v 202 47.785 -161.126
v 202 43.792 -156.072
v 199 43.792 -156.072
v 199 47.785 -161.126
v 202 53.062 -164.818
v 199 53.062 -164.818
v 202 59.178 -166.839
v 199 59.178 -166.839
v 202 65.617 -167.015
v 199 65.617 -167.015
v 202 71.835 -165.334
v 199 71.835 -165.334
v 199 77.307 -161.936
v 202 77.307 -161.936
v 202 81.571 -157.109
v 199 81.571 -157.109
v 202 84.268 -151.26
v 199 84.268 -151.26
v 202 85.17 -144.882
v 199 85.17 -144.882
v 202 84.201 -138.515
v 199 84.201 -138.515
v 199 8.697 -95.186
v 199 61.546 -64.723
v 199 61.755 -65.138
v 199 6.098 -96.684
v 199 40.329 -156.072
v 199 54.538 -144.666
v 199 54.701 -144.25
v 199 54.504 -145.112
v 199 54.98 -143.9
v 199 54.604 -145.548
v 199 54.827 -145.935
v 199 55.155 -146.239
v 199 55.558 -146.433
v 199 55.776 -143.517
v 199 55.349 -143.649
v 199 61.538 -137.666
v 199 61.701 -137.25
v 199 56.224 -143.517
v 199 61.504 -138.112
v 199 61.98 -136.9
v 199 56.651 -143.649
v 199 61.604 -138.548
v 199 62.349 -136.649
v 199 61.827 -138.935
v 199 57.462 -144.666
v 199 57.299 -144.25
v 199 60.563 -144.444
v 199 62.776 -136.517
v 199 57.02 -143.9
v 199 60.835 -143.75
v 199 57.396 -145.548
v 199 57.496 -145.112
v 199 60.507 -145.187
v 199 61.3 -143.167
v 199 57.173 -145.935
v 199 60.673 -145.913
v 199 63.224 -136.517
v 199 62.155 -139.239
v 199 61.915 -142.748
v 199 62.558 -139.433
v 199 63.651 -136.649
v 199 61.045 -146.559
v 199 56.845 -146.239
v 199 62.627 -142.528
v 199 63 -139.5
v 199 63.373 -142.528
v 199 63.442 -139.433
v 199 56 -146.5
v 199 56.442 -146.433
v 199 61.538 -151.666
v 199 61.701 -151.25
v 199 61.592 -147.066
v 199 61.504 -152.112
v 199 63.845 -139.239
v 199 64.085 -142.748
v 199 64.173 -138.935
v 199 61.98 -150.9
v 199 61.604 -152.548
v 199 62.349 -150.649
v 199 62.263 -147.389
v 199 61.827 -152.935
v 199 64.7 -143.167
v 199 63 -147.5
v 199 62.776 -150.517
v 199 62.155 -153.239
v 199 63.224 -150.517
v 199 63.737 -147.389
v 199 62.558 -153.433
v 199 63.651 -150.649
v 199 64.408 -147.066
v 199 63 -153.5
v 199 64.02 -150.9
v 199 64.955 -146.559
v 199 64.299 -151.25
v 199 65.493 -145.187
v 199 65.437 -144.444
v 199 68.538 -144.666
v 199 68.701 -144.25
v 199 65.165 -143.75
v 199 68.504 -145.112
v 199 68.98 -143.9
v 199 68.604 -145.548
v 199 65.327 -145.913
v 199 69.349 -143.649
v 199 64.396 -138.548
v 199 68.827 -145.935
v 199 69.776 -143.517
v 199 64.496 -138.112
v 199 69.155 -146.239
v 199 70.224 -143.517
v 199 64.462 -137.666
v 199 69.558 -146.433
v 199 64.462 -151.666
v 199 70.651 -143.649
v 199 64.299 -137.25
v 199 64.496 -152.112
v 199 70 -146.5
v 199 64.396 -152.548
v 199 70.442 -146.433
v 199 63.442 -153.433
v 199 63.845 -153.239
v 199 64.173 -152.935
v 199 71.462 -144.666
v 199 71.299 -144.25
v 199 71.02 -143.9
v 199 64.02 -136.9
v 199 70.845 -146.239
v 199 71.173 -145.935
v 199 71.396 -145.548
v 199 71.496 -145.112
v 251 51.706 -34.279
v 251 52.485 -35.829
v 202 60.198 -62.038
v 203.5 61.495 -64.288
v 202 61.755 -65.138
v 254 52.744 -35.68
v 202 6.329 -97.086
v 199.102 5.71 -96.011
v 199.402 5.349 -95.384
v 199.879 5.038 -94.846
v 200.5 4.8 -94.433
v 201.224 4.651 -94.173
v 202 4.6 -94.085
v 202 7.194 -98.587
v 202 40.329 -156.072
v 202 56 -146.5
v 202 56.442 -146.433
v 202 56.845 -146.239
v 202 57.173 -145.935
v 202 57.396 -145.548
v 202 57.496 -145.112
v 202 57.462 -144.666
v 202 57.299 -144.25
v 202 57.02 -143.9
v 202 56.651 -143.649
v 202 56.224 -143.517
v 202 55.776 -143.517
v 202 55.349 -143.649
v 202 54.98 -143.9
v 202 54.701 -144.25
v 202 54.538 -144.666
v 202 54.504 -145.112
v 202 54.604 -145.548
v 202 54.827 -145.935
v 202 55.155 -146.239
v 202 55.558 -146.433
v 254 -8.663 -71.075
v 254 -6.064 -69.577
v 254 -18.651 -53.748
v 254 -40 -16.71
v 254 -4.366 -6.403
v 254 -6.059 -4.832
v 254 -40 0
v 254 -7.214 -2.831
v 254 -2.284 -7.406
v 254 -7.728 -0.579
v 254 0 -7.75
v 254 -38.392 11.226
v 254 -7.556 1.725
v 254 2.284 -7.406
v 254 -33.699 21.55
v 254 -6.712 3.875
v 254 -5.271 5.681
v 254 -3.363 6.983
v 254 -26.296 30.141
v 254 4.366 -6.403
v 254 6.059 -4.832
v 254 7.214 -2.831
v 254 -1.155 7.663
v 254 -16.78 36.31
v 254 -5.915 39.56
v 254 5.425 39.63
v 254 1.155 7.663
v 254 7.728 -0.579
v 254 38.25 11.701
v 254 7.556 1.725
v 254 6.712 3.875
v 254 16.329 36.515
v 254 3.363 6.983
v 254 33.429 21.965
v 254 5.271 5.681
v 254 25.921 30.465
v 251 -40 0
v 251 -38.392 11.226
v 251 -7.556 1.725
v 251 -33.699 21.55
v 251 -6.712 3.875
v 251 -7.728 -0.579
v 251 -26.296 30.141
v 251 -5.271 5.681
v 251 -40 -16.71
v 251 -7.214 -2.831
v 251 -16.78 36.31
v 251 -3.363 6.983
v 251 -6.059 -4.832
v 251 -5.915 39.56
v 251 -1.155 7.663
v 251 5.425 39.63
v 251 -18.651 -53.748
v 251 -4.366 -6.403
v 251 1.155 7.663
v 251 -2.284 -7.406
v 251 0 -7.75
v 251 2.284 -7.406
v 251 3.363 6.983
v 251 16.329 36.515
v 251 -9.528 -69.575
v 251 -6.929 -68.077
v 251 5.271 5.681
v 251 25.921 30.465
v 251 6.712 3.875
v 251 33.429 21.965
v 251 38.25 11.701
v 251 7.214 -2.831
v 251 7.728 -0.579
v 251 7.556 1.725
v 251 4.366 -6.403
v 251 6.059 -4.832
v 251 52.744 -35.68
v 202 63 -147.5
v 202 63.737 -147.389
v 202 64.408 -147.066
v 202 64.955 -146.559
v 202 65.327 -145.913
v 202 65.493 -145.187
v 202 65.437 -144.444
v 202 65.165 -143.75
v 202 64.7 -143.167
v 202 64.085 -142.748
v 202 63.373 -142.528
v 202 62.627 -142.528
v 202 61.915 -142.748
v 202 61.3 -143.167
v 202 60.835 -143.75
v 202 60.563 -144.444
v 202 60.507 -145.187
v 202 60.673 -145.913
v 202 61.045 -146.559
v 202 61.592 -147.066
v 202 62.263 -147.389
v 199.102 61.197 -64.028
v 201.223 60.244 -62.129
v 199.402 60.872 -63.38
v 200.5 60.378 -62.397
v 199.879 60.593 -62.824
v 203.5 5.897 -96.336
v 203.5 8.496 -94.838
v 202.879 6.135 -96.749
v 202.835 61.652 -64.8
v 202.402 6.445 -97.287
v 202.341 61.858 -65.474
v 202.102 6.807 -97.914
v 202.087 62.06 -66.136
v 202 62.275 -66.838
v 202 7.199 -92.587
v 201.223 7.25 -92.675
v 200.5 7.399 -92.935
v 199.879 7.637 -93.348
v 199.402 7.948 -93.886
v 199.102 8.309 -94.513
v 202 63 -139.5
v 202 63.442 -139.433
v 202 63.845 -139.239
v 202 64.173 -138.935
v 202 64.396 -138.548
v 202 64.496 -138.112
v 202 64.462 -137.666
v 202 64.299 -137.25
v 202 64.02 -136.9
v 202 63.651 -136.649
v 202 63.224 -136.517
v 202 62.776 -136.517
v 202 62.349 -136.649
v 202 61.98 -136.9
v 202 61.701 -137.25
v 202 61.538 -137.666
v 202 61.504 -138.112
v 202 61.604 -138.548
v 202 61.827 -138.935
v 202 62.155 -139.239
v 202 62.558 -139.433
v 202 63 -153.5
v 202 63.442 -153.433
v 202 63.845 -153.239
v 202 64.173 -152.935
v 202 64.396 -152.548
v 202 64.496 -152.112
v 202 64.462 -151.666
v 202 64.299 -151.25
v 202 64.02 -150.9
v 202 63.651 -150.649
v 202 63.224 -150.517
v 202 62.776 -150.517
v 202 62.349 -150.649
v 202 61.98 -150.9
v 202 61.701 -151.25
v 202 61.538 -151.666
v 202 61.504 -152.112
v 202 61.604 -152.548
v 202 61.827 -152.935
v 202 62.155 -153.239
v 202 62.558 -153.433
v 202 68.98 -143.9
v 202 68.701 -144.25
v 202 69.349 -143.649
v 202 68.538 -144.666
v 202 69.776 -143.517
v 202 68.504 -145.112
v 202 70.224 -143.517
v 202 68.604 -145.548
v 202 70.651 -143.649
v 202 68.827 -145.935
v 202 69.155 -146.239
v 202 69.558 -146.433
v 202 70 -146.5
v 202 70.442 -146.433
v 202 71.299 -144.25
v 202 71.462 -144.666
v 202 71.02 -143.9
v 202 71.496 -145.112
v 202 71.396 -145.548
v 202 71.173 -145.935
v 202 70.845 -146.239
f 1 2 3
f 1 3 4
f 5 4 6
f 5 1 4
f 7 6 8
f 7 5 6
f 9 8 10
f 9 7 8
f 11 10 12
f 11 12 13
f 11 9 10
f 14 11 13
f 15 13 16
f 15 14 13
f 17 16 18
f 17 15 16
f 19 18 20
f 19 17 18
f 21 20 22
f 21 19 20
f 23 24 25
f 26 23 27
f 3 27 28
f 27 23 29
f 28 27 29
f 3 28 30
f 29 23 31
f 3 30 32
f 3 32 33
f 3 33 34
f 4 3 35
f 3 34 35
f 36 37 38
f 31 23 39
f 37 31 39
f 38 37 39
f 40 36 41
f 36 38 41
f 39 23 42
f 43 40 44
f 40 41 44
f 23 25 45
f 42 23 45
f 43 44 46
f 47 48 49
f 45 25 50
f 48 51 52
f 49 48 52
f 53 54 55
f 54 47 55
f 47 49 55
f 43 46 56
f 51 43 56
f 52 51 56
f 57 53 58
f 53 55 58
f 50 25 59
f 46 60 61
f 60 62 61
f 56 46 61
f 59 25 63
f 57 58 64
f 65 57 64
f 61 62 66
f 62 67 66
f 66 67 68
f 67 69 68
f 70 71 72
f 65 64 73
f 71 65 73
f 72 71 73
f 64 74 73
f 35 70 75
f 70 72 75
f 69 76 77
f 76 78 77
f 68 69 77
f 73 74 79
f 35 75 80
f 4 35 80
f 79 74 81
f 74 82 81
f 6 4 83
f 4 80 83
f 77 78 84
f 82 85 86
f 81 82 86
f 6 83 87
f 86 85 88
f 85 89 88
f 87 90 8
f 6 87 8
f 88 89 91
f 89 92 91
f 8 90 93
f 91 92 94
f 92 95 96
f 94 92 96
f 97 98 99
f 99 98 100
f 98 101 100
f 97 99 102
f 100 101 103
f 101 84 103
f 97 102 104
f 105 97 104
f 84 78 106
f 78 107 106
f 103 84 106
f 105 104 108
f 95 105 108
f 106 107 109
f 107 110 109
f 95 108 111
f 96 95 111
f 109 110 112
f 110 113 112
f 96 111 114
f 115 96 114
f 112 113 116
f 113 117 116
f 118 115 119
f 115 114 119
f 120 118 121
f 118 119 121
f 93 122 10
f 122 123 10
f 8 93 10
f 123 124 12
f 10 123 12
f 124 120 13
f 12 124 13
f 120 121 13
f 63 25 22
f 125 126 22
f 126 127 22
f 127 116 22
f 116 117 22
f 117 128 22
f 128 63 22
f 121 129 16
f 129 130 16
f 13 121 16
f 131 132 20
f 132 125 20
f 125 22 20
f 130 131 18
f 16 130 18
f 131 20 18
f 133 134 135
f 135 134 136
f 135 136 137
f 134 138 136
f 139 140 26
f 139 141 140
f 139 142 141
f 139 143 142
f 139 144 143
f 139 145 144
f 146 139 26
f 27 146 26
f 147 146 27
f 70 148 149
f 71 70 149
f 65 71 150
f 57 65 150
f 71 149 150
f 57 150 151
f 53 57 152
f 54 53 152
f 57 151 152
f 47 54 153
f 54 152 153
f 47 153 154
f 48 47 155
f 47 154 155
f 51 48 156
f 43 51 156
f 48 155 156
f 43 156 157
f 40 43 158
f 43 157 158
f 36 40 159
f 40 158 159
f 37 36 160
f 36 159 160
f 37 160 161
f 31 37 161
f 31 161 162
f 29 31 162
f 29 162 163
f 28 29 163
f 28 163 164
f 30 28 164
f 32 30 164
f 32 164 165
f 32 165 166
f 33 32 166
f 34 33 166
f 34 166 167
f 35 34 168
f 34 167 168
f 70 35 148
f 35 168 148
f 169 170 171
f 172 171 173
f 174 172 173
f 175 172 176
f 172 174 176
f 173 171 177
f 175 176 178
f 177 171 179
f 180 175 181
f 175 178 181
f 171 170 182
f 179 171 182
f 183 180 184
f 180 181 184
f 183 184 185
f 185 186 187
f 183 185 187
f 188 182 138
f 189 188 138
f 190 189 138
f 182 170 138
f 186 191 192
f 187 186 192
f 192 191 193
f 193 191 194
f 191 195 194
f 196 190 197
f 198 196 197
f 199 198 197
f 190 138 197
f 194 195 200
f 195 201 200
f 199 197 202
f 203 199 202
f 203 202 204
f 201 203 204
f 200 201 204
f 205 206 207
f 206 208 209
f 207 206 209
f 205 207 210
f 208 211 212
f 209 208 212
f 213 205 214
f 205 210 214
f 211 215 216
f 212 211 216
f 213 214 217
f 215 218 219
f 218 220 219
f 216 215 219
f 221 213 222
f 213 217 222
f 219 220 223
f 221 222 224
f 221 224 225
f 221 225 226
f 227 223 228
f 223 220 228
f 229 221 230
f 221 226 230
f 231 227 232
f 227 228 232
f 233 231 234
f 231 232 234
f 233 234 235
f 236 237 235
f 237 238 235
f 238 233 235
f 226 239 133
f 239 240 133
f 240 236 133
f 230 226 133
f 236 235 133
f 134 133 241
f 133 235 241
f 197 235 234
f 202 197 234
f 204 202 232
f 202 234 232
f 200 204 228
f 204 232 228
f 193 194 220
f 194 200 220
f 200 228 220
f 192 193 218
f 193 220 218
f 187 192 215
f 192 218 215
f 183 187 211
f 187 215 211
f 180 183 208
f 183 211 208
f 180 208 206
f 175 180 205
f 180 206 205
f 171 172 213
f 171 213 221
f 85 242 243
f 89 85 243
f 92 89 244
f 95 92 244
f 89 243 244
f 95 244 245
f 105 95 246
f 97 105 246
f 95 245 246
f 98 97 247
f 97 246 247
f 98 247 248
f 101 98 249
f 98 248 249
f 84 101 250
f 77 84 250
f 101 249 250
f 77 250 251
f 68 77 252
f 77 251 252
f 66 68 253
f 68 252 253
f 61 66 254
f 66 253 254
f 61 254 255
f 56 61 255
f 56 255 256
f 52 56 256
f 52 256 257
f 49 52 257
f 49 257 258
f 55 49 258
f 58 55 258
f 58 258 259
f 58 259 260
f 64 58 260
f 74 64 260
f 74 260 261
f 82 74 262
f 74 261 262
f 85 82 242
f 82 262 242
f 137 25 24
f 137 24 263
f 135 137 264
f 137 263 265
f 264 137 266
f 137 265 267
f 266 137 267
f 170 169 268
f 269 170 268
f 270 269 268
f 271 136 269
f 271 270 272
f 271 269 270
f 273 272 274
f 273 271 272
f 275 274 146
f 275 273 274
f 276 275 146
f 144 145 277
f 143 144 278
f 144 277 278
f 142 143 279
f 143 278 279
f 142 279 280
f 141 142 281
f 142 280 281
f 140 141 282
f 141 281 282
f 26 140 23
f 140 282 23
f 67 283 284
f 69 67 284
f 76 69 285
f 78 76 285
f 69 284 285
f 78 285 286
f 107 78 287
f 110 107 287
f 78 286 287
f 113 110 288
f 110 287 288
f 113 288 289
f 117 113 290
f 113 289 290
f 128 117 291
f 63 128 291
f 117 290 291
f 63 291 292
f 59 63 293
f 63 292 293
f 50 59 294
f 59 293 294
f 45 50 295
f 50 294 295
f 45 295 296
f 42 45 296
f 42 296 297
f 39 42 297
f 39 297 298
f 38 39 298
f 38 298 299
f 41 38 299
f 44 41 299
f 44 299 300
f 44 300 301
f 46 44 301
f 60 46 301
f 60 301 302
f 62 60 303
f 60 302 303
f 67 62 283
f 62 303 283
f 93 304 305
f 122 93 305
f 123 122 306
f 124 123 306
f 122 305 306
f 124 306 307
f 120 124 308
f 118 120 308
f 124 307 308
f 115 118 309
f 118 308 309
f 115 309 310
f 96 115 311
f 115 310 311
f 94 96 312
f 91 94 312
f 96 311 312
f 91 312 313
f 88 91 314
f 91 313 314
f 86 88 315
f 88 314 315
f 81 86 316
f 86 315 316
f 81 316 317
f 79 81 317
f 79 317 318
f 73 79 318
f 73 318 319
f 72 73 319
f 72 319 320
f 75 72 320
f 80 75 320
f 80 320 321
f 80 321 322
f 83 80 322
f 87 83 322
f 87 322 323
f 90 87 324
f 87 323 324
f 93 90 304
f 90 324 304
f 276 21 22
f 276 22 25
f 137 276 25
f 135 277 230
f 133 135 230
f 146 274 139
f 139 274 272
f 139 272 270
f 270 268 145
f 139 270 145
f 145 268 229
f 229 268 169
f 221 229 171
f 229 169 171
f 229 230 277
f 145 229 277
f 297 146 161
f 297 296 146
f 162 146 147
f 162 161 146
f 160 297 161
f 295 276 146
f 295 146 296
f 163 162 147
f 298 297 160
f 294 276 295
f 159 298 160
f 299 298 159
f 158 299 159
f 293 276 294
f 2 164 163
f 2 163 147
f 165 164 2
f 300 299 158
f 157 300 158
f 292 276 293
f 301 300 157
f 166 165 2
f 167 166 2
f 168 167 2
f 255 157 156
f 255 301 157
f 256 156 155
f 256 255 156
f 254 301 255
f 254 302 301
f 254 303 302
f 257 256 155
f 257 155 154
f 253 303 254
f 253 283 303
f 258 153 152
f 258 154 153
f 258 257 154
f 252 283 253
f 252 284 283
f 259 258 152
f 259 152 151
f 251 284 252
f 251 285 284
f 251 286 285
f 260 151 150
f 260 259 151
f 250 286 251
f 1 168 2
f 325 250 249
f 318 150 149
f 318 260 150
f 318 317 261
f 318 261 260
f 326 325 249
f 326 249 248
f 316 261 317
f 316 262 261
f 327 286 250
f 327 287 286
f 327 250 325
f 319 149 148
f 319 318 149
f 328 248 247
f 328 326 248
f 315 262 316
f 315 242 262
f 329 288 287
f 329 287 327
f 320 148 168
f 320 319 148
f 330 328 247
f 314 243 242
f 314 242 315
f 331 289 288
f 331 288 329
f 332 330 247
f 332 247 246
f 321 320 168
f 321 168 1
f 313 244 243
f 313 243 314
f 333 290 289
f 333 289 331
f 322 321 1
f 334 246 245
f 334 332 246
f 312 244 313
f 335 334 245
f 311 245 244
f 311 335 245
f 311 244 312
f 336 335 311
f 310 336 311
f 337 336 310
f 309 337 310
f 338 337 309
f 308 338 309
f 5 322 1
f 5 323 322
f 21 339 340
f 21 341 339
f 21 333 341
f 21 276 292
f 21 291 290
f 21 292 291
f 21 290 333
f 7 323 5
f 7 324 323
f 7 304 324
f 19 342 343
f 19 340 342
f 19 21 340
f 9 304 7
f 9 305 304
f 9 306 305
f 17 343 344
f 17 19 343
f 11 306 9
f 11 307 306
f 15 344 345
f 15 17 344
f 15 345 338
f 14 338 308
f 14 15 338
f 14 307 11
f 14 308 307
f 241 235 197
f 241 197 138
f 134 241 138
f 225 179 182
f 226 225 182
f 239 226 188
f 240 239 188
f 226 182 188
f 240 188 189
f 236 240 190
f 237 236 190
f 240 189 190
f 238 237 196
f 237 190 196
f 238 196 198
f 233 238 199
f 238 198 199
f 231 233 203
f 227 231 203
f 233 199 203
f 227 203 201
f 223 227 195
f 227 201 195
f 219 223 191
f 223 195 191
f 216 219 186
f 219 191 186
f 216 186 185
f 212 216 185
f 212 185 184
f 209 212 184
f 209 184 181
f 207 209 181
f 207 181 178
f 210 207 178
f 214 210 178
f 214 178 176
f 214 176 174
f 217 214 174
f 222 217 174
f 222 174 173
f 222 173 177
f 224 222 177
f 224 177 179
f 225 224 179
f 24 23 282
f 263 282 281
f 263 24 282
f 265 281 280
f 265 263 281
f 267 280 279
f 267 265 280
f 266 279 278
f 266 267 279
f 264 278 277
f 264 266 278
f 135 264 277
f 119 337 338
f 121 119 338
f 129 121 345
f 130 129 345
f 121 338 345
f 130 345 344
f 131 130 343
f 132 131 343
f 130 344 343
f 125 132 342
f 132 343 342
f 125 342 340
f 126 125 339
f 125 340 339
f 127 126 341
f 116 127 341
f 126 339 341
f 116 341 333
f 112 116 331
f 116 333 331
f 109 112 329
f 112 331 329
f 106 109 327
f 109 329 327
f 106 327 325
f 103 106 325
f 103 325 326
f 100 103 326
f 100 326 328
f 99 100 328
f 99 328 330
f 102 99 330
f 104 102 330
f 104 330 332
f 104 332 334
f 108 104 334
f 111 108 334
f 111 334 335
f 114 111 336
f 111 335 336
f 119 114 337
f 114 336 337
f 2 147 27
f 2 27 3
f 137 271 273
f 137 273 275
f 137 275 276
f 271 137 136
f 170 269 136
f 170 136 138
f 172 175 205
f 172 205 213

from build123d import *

# Parameters (mm, degrees)
SKETCH_2_R           = 3
SKETCH_2_R_2         = 1.5
SKETCH_2_R_3         = 2.5
EXTRUDE_1_DEPTH      = 3
EXTRUDE_2_DEPTH      = 196
SKETCH_5_R           = 8
CUT_EXTRUDE_1_DEPTH  = 10
SKETCH_6_R           = 4.05
CUT_EXTRUDE_2_DEPTH  = 10
SKETCH_8_R           = 40
EXTRUDE_3_DEPTH      = 3
EXTRUDE_START        = -61
EXTRUDE_4_DEPTH      = 64
EXTRUDE_5_DEPTH      = 3
EXTRUDE_START_2      = -3
EXTRUDE_14_DEPTH     = 3
EXTRUDE_15_DEPTH     = 3
SKETCH_16_R          = 40
EXTRUDE_16_DEPTH     = 3
CUT_EXTRUDE_START    = -20
CUT_EXTRUDE_5_DEPTH  = 20
CUT_EXTRUDE_6_DEPTH  = 20
CUT_EXTRUDE_7_DEPTH  = 3
FILLET_3_R           = 3
FILLET_4_R           = 3
FILLET_5_R           = 3
FILLET_6_R           = 3
SKETCH_22_R          = 7.75
CUT_EXTRUDE_8_DEPTH  = 10
SKETCH_23_R          = 4.05
CUT_EXTRUDE_9_DEPTH  = 10
CUT_EXTRUDE_10_DEPTH = 10
CUT_EXTRUDE_11_DEPTH = 10
SKETCH_26_W          = 471.047466431
SKETCH_26_H          = 304.479350924
CUT_EXTRUDE_12_DEPTH = 135


# Some blends are built 0.0001 mm under size
with BuildPart() as part:
    # 草图2 → 凸台-拉伸1 (new body)
    with BuildSketch(Plane(origin=(0, 0, 0), x_dir=(0, 0, -1), z_dir=(1, 0, 0))):
        with BuildLine():
            Line((138.514809283, 84.200667909), (-11.70063651, 38.25042621))
            ThreePointArc((-11.70063651, 38.25042621), (-39.560188627, -5.915359313), (0, -40))
            Line((0, -40), (16.710190716, -40))
            Line((16.710190716, -40), (156.071648789, 40.329376559))
            Line((156.071648789, 40.329376559), (156.071648789, 43.792069046))
            ThreePointArc((156.071648789, 43.792069046), (165.334026038, 71.834783727), (138.514809283, 84.200667909))
        make_face()
        Circle(SKETCH_2_R, mode=Mode.SUBTRACT)
        with Locations((145, 70)):
            Circle(SKETCH_2_R_2, mode=Mode.SUBTRACT)
        with Locations((138, 63)):
            Circle(SKETCH_2_R_2, mode=Mode.SUBTRACT)
        with Locations((145, 56)):
            Circle(SKETCH_2_R_2, mode=Mode.SUBTRACT)
        with Locations((145, 63)):
            Circle(SKETCH_2_R_3, mode=Mode.SUBTRACT)
        with Locations((152, 63)):
            Circle(SKETCH_2_R_2, mode=Mode.SUBTRACT)
    extrude_1 = extrude(amount=EXTRUDE_1_DEPTH)

    # 草图4 → 凸台-拉伸2 (add)
    with BuildSketch(Plane(origin=(3, 0, 0), x_dir=(0, 0, -1), z_dir=(1, 0, 0))):
        with BuildLine():
            Line((0, -40), (16.710190716, -40))
            Line((16.710190716, -40), (156.071648789, 40.329376559))
            Line((156.071648789, 40.329376559), (156.071648789, 43.792069046))
            Line((156.071648789, 43.792069046), (19.975563357, -34.655113166))
            ThreePointArc((19.975563357, -34.655113166), (10.339136167, -38.640681455), (0, -40))
        make_face()
    extrude(amount=EXTRUDE_2_DEPTH)

    # 镜向2: 凸台-拉伸1 across plane
    add(extrude_1.mirror(Plane(origin=(101, 0, 0), x_dir=(0, 0, 1), z_dir=(1, 0, 0))))

    # 草图5 → 切除-拉伸1 (cut)
    with BuildSketch(Plane(origin=(202, 0, 0), x_dir=(0, 0, -1), z_dir=(1, 0, 0))):
        Circle(SKETCH_5_R)
    extrude(amount=-CUT_EXTRUDE_1_DEPTH, mode=Mode.SUBTRACT)

    # 草图6 → 切除-拉伸2 (cut)
    with BuildSketch(Plane.ZY):
        Circle(SKETCH_6_R)
    extrude(amount=-CUT_EXTRUDE_2_DEPTH, mode=Mode.SUBTRACT)

    # 草图9 → 凸台-拉伸4 (add)
    with BuildSketch(Plane(origin=(251, 0, 0), x_dir=(0, 0, -1), z_dir=(1, 0, 0)).offset(EXTRUDE_START)):
        with BuildLine():
            Line((0, -40), (16.710190716, -40))
            Line((16.710190716, -40), (53.747942483, -18.651059269))
            Line((53.747942483, -18.651059269), (52.249775231, -16.051925781))
            Line((52.249775231, -16.051925781), (19.975563357, -34.655113166))
            ThreePointArc((19.975563357, -34.655113166), (10.339136167, -38.640681455), (0, -40))
        make_face()
    extrude_4 = extrude(amount=EXTRUDE_4_DEPTH)

    # 草图10 → 凸台-拉伸5 (add)
    with BuildSketch(Plane(origin=(0, -37.254246654, -21.473730609), x_dir=(1, 0, 0), z_dir=(0, -0.8663778291595938, -0.49938908392225567))):
        Polygon((254, -37.251890328), (254, -57.251890328), (202, -87.274104325), (202, -37.251890328), align=None)
    extrude_5 = extrude(amount=-EXTRUDE_5_DEPTH)



with BuildPart() as body_2:
    # 草图8 → 凸台-拉伸3 (new body)
    with BuildSketch(Plane(origin=(251, 0, 0), x_dir=(0, 0, -1), z_dir=(1, 0, 0))):
        Circle(SKETCH_8_R)
    extrude(amount=EXTRUDE_3_DEPTH)


with BuildPart() as part_1:
    add(part.part)

    add(body_2.part)  # 凸台-拉伸14 merges body 2
    # 草图14 → 凸台-拉伸14 (add)
    with BuildSketch(Plane(origin=(254, 0, 0), x_dir=(0, 0, -1), z_dir=(1, 0, 0)).offset(EXTRUDE_START_2)):
        with BuildLine():
            Line((-11.70063651, 38.25042621), (35.679778873, 52.743886101))
            Line((35.679778873, 52.743886101), (69.577331814, -6.064144103))
            Line((69.577331814, -6.064144103), (19.975563357, -34.655113166))
            ThreePointArc((19.975563357, -34.655113166), (36.686823541, 15.939792297), (-11.70063651, 38.25042621))
        make_face()
    extrude_14 = extrude(amount=EXTRUDE_14_DEPTH)

    # 草图15 → 凸台-拉伸15 (add)
    with BuildSketch(Plane(origin=(88.290795719, 76.368648195, -132.490087928), x_dir=(-0.8660254037844362, 0.24969454196113006, -0.43318891457980085), z_dir=(0.5000000000000046, 0.43248363304931103, -0.7503052093278205))):
        Polygon((-191.344507397, -43), (-191.344507397, 27.878041456), (-131.300079402, 20.97393325), (-131.300079402, -43), align=None)
    extrude_15 = extrude(amount=-EXTRUDE_15_DEPTH)

    # 镜向8: 凸台-拉伸15 across plane
    add(extrude_15.mirror(Plane(origin=(101, 0, 0), x_dir=(0, 0, 1), z_dir=(1, 0, 0))))

    # 镜向10: 凸台-拉伸5 across plane
    add(extrude_5.mirror(Plane(origin=(101, 0, 0), x_dir=(0, 0, 1), z_dir=(1, 0, 0))))

    # 镜向11: 凸台-拉伸4 across plane
    add(extrude_4.mirror(Plane(origin=(101, 0, 0), x_dir=(0, 0, 1), z_dir=(1, 0, 0))))

    # 镜向12: 凸台-拉伸14 across plane
    add(extrude_14.mirror(Plane(origin=(101, 0, 0), x_dir=(0, 0, 1), z_dir=(1, 0, 0))))

    # 草图16 → 凸台-拉伸16 (add)
    with BuildSketch(Plane.ZY.offset(52)):
        Circle(SKETCH_16_R)
    extrude(amount=-EXTRUDE_16_DEPTH)

    # 草图17 → 切除-拉伸5 (cut)
    with BuildSketch(Plane(origin=(202, 0, 0), x_dir=(0, 0, -1), z_dir=(1, 0, 0)).offset(CUT_EXTRUDE_START)):
        with BuildLine():
            Line((-11.120326036, 38.423148607), (61.739147636, 60.715331959))
            Line((61.739147636, 60.715331959), (65.138195736, 61.755085767))
            Line((65.138195736, 61.755085767), (62.037518083, 60.197696416))
            Line((62.037518083, 60.197696416), (92.586691567, 7.198687311))
            Line((92.586691567, 7.198687311), (19.975563357, -34.655113166))
            ThreePointArc((19.975563357, -34.655113166), (-36.806411031, -15.66167638), (-11.120326036, 38.423148607))
        make_face()
    extrude(amount=CUT_EXTRUDE_5_DEPTH, mode=Mode.SUBTRACT)


with BuildPart() as cut_extrude_5_piece_1:
    # of the separate pieces the step leaves, piece 1, a body of its own (cut_extrude_5_pieces)
    add(part_1.part.solids().sort_by_distance((0, 43.792069046, -156.071648789))[0])

    # 草图21 → 切除-拉伸7 (cut)
    with BuildSketch(Plane(origin=(3, 0, 0), x_dir=(0, 0, -1), z_dir=(1, 0, 0))):
        with BuildLine():
            Line((92.586691567, 7.198687311), (62.037518083, 60.197696416))
            Line((62.037518083, 60.197696416), (65.138195736, 61.755085767))
            Line((65.138195736, 61.755085767), (61.739147636, 60.715331959))
            Line((61.739147636, 60.715331959), (-11.70063651, 38.25042621))
            ThreePointArc((-11.70063651, 38.25042621), (-36.686823541, -15.939792297), (19.975563357, -34.655113166))
            Line((19.975563357, -34.655113166), (92.586691567, 7.198687311))
        make_face()
    extrude(amount=-CUT_EXTRUDE_7_DEPTH, mode=Mode.SUBTRACT)

    # 圆角3
    fillet_3_edges = [cut_extrude_5_piece_1.edges().sort_by_distance(p)[0] for p in [
        (3, 33.698191863, -77.312104825),
    ]]
    fillet(fillet_3_edges, radius=FILLET_3_R - 0.0001)  # a hair under: the kernel refuses the full size

    # 圆角4
    fillet_4_edges = [cut_extrude_5_piece_1.edges().sort_by_distance(p)[0] for p in [
        (199, 33.698191863, -77.312104825),
    ]]
    fillet(fillet_4_edges, radius=FILLET_4_R - 0.0001)  # a hair under: the kernel refuses the full size

    # 圆角5
    # the kernel refuses this fillet: 3 mm, written as the material it adds along each edge
    with BuildSketch(Plane(origin=(202, 65.506611814, -62.97577757), x_dir=(0, 0.49938908392225567, -0.8663778291595938), z_dir=(0, -0.8663778291595938, -0.49938908392225567))) as fillet_5_piece_1_section:
        with BuildLine():
            CenterArc((FILLET_5_R * 0.57735026919, FILLET_5_R), FILLET_5_R, 210, 60)
            Line((-FILLET_5_R * 0.288675134595, FILLET_5_R * 0.5), (0, 0))
            Line((0, 0), (FILLET_5_R * 0.57735026919, 0))
        make_face()
    fillet_5_piece_1 = extrude(amount=68.304060269, mode=Mode.PRIVATE)
    fillet_5_piece_1 = split(fillet_5_piece_1, bisect_by=Plane(origin=(202.325553984, 63.906694987, -72.171998522), z_dir=(0, -0.9562606552534866, -0.2925159127537726)), keep=Keep.TOP, mode=Mode.PRIVATE)
    fillet_5_piece_1 = split(fillet_5_piece_1, bisect_by=Plane(origin=(199.177617764, 62.412552566, -67.072312804), z_dir=(0.09892666816624703, -0.8892295154916122, -0.446636746253684)), keep=Keep.TOP, mode=Mode.PRIVATE)
    add(fillet_5_piece_1)

    # 圆角6
    # the kernel refuses this fillet: 3 mm, written as the material it adds along each edge
    with BuildSketch(Plane(origin=(0, 6.329488355, -97.086079656), x_dir=(0, 0.49938908392225556, -0.8663778291595938), z_dir=(0, 0.8663778291595938, 0.4993890839222556))) as fillet_6_piece_1_section:
        with BuildLine():
            CenterArc((FILLET_6_R * 0.57735026919, FILLET_6_R), FILLET_6_R, 210, 60)
            Line((-FILLET_6_R * 0.288675134595, FILLET_6_R * 0.5), (0, 0))
            Line((0, 0), (FILLET_6_R * 0.57735026919, 0))
        make_face()
    fillet_6_piece_1 = extrude(amount=68.304060269, mode=Mode.PRIVATE)
    fillet_6_piece_1 = split(fillet_6_piece_1, bisect_by=Plane(origin=(-0.325553984, 63.906694987, -72.171998522), z_dir=(0, -0.9562606552534866, -0.2925159127537726)), keep=Keep.TOP, mode=Mode.PRIVATE)
    fillet_6_piece_1 = split(fillet_6_piece_1, bisect_by=Plane(origin=(2.822382236, 62.412552566, -67.072312804), z_dir=(-0.09892666816624703, -0.8892295154916122, -0.446636746253684)), keep=Keep.TOP, mode=Mode.PRIVATE)
    add(fillet_6_piece_1)

    # 草图22 → 切除-拉伸8 (cut)
    with BuildSketch(Plane(origin=(254, 0, 0), x_dir=(0, 0, -1), z_dir=(1, 0, 0))):
        Circle(SKETCH_22_R)
    extrude(amount=-CUT_EXTRUDE_8_DEPTH, mode=Mode.SUBTRACT)

    # 草图23 → 切除-拉伸9 (cut)
    with BuildSketch(Plane.ZY.offset(52)):
        Circle(SKETCH_23_R)
    extrude(amount=-CUT_EXTRUDE_9_DEPTH, mode=Mode.SUBTRACT)

    # 草图24 → 切除-拉伸10 (cut)
    with BuildSketch(Plane(origin=(0, -34.655113166, -19.975563357), x_dir=(1, 0, 0), z_dir=(0, 0.8663778291595939, 0.4993890839222556))):
        with BuildLine():
            Line((3, 179.256683584), (3, 86.81000271))
            ThreePointArc((3, 86.81000271), (2.121320344, 84.688682367), (0, 83.81000271))
            Line((0, 83.81000271), (-49, 55.51983952))
            Line((-49, 55.51983952), (-49, -19.975563357))
            Line((-49, -19.975563357), (251, -19.975563357))
            Line((251, -19.975563357), (251, 55.51983952))
            Line((251, 55.51983952), (202, 83.81000271))
            ThreePointArc((202, 83.81000271), (199.878679656, 84.688682367), (199, 86.81000271))
            Line((199, 86.81000271), (199, 179.256683584))
            Line((199, 179.256683584), (3, 179.256683584))
        make_face()
    extrude(amount=-CUT_EXTRUDE_10_DEPTH, mode=Mode.SUBTRACT)

    # 草图25 → 切除-拉伸11 (cut)
    with BuildSketch(Plane.XZ.offset(40)):
        Polygon((-49, 40), (-49, -27.969882149), (251, -27.969882149), (251, 42.699584458), align=None)
    extrude(amount=-CUT_EXTRUDE_11_DEPTH, mode=Mode.SUBTRACT)


with BuildPart() as cut_extrude_5_piece_2:
    # of the separate pieces the step leaves, piece 2, a body of its own (cut_extrude_5_pieces)
    add(part_1.part.solids().sort_by_distance((202, 60.715331959, -61.739147636))[0])

    # 草图18 → 切除-拉伸6 (cut)
    with BuildSketch(Plane(origin=(0, 38.25042621, 11.70063651), x_dir=(1, 0, 0), z_dir=(0, 0.9562606552534866, 0.2925159127537726))):
        Polygon((199, 76.798918519), (202, 76.932821805), (202, 0), (199, 0), align=None)
    extrude(amount=-CUT_EXTRUDE_6_DEPTH, mode=Mode.SUBTRACT)


with BuildPart() as cut_extrude_11_piece_1:
    # of the separate pieces the step leaves, piece 1, a body of its own (cut_extrude_11_pieces)
    add(cut_extrude_5_piece_1.part.solids().sort_by_distance((-1.5, 5.897004722, -96.335774447))[0])

    # 草图26 → 切除-拉伸12 (cut)
    with BuildSketch(Plane(origin=(3, 0, 0), x_dir=(0, 0, -1), z_dir=(1, 0, 0))):
        with Locations((179.814409689, 100.362016139)):
            Rectangle(SKETCH_26_W, SKETCH_26_H)
    extrude(amount=-CUT_EXTRUDE_12_DEPTH, mode=Mode.SUBTRACT)


with BuildPart() as cut_extrude_11_piece_2:
    # of the separate pieces the step leaves, piece 2, a body of its own (cut_extrude_11_pieces)
    add(cut_extrude_5_piece_1.part.solids().sort_by_distance((251, -40, 0))[0])


solid = cut_extrude_11_piece_2.part
